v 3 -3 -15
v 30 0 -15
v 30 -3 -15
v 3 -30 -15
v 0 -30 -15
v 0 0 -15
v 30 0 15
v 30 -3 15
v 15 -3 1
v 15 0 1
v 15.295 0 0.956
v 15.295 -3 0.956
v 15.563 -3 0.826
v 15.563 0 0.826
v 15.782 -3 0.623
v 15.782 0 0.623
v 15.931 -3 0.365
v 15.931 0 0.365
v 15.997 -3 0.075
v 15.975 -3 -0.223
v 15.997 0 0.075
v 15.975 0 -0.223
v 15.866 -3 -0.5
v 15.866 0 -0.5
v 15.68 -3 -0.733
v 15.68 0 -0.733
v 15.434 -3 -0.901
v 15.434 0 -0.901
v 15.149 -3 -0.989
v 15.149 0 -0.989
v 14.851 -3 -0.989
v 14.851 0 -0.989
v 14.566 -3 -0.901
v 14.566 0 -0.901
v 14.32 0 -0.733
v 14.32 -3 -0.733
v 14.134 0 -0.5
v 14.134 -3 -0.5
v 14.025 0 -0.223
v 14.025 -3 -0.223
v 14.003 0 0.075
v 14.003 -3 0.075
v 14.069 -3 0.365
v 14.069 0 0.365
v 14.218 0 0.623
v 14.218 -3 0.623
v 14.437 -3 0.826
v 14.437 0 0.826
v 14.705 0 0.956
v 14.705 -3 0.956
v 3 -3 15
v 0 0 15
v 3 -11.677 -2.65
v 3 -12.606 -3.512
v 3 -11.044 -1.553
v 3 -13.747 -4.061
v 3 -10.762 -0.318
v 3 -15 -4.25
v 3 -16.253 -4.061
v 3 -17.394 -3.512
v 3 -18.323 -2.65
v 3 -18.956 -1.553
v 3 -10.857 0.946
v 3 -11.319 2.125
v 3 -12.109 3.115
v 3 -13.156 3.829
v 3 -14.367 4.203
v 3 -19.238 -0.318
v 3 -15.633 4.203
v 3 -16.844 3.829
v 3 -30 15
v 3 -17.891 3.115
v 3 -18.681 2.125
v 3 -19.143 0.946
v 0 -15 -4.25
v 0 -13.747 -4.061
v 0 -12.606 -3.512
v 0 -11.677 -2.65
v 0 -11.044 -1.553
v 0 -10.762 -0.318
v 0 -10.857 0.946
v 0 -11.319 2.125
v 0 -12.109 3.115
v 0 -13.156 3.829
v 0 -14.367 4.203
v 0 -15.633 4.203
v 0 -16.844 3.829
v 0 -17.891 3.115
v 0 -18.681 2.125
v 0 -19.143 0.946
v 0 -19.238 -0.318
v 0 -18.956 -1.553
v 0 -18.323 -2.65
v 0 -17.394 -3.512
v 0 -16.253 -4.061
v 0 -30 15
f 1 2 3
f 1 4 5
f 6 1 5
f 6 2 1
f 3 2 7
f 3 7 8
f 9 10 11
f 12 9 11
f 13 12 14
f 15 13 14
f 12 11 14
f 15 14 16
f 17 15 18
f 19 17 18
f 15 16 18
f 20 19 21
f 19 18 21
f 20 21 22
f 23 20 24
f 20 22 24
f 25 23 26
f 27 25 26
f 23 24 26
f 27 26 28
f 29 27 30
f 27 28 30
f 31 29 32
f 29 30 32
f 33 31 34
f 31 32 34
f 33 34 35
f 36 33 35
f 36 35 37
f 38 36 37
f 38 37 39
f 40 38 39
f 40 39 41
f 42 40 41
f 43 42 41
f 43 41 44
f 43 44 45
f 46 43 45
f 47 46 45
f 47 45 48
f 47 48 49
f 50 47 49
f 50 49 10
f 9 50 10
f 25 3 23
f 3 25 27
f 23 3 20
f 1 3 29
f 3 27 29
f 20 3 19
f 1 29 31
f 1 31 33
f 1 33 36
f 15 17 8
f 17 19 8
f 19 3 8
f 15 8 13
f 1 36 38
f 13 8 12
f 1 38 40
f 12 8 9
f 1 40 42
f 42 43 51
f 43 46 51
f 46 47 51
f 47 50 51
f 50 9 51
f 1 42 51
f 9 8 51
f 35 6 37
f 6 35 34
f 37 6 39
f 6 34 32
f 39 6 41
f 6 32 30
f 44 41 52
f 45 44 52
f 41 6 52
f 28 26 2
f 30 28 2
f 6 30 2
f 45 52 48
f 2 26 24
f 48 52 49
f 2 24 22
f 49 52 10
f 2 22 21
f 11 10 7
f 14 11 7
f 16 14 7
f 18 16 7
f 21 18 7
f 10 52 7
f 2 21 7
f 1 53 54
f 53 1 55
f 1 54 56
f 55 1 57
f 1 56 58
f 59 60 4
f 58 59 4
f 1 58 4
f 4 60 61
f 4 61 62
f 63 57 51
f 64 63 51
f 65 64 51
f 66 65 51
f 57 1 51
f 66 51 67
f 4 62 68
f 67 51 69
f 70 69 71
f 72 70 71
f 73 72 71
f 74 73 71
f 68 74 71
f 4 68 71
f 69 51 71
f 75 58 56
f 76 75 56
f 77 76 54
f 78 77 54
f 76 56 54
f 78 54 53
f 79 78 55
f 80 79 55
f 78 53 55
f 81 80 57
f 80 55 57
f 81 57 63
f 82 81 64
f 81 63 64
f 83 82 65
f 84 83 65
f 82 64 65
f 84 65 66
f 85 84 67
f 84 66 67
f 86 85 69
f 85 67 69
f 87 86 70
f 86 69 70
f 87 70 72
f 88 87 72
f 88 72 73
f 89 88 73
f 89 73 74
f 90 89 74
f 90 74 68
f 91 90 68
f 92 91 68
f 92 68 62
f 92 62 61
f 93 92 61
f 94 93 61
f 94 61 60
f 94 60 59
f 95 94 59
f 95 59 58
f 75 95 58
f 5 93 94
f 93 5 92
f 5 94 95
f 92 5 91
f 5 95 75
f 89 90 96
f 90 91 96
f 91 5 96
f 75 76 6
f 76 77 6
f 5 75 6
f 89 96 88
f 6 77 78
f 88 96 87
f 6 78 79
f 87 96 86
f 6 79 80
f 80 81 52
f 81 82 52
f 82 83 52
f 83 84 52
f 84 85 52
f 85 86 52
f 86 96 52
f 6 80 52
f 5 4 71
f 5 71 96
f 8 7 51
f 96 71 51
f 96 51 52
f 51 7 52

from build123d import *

# Parameters (mm, degrees)
EXTRUDE_1_DEPTH     = 15
SKETCH_3_R          = 4.25
CUT_EXTRUDE_1_DEPTH = 44.058100283
SKETCH_5_R          = 1
CUT_EXTRUDE_2_DEPTH = 46


with BuildPart() as part:
    # 草图1 → 凸台-拉伸1 (new, symmetric)
    with BuildSketch(Plane.XY):
        Polygon((0, -30), (0, 0), (30, 0), (30, -3), (3, -3), (3, -30), align=None)
    extrude(amount=EXTRUDE_1_DEPTH, both=True)

    # 草图3 → 切除-拉伸1 (cut, through all)
    with BuildSketch(Plane(origin=(3, 0, 0), x_dir=(0, 0, -1), z_dir=(1, 0, 0))):
        with Locations((0, -15)):
            Circle(SKETCH_3_R)
    extrude(amount=-CUT_EXTRUDE_1_DEPTH, mode=Mode.SUBTRACT)

    # 草图5 → 切除-拉伸2 (cut, through all)
    with BuildSketch(Plane(origin=(0, 0, 0), x_dir=(1, 0, 0), z_dir=(0, 1, 0))):
        with Locations(Location((15, 0, 0), (0, 0, 270))):
            Circle(SKETCH_5_R)
    extrude(amount=-CUT_EXTRUDE_2_DEPTH, mode=Mode.SUBTRACT)


solid = part.part
